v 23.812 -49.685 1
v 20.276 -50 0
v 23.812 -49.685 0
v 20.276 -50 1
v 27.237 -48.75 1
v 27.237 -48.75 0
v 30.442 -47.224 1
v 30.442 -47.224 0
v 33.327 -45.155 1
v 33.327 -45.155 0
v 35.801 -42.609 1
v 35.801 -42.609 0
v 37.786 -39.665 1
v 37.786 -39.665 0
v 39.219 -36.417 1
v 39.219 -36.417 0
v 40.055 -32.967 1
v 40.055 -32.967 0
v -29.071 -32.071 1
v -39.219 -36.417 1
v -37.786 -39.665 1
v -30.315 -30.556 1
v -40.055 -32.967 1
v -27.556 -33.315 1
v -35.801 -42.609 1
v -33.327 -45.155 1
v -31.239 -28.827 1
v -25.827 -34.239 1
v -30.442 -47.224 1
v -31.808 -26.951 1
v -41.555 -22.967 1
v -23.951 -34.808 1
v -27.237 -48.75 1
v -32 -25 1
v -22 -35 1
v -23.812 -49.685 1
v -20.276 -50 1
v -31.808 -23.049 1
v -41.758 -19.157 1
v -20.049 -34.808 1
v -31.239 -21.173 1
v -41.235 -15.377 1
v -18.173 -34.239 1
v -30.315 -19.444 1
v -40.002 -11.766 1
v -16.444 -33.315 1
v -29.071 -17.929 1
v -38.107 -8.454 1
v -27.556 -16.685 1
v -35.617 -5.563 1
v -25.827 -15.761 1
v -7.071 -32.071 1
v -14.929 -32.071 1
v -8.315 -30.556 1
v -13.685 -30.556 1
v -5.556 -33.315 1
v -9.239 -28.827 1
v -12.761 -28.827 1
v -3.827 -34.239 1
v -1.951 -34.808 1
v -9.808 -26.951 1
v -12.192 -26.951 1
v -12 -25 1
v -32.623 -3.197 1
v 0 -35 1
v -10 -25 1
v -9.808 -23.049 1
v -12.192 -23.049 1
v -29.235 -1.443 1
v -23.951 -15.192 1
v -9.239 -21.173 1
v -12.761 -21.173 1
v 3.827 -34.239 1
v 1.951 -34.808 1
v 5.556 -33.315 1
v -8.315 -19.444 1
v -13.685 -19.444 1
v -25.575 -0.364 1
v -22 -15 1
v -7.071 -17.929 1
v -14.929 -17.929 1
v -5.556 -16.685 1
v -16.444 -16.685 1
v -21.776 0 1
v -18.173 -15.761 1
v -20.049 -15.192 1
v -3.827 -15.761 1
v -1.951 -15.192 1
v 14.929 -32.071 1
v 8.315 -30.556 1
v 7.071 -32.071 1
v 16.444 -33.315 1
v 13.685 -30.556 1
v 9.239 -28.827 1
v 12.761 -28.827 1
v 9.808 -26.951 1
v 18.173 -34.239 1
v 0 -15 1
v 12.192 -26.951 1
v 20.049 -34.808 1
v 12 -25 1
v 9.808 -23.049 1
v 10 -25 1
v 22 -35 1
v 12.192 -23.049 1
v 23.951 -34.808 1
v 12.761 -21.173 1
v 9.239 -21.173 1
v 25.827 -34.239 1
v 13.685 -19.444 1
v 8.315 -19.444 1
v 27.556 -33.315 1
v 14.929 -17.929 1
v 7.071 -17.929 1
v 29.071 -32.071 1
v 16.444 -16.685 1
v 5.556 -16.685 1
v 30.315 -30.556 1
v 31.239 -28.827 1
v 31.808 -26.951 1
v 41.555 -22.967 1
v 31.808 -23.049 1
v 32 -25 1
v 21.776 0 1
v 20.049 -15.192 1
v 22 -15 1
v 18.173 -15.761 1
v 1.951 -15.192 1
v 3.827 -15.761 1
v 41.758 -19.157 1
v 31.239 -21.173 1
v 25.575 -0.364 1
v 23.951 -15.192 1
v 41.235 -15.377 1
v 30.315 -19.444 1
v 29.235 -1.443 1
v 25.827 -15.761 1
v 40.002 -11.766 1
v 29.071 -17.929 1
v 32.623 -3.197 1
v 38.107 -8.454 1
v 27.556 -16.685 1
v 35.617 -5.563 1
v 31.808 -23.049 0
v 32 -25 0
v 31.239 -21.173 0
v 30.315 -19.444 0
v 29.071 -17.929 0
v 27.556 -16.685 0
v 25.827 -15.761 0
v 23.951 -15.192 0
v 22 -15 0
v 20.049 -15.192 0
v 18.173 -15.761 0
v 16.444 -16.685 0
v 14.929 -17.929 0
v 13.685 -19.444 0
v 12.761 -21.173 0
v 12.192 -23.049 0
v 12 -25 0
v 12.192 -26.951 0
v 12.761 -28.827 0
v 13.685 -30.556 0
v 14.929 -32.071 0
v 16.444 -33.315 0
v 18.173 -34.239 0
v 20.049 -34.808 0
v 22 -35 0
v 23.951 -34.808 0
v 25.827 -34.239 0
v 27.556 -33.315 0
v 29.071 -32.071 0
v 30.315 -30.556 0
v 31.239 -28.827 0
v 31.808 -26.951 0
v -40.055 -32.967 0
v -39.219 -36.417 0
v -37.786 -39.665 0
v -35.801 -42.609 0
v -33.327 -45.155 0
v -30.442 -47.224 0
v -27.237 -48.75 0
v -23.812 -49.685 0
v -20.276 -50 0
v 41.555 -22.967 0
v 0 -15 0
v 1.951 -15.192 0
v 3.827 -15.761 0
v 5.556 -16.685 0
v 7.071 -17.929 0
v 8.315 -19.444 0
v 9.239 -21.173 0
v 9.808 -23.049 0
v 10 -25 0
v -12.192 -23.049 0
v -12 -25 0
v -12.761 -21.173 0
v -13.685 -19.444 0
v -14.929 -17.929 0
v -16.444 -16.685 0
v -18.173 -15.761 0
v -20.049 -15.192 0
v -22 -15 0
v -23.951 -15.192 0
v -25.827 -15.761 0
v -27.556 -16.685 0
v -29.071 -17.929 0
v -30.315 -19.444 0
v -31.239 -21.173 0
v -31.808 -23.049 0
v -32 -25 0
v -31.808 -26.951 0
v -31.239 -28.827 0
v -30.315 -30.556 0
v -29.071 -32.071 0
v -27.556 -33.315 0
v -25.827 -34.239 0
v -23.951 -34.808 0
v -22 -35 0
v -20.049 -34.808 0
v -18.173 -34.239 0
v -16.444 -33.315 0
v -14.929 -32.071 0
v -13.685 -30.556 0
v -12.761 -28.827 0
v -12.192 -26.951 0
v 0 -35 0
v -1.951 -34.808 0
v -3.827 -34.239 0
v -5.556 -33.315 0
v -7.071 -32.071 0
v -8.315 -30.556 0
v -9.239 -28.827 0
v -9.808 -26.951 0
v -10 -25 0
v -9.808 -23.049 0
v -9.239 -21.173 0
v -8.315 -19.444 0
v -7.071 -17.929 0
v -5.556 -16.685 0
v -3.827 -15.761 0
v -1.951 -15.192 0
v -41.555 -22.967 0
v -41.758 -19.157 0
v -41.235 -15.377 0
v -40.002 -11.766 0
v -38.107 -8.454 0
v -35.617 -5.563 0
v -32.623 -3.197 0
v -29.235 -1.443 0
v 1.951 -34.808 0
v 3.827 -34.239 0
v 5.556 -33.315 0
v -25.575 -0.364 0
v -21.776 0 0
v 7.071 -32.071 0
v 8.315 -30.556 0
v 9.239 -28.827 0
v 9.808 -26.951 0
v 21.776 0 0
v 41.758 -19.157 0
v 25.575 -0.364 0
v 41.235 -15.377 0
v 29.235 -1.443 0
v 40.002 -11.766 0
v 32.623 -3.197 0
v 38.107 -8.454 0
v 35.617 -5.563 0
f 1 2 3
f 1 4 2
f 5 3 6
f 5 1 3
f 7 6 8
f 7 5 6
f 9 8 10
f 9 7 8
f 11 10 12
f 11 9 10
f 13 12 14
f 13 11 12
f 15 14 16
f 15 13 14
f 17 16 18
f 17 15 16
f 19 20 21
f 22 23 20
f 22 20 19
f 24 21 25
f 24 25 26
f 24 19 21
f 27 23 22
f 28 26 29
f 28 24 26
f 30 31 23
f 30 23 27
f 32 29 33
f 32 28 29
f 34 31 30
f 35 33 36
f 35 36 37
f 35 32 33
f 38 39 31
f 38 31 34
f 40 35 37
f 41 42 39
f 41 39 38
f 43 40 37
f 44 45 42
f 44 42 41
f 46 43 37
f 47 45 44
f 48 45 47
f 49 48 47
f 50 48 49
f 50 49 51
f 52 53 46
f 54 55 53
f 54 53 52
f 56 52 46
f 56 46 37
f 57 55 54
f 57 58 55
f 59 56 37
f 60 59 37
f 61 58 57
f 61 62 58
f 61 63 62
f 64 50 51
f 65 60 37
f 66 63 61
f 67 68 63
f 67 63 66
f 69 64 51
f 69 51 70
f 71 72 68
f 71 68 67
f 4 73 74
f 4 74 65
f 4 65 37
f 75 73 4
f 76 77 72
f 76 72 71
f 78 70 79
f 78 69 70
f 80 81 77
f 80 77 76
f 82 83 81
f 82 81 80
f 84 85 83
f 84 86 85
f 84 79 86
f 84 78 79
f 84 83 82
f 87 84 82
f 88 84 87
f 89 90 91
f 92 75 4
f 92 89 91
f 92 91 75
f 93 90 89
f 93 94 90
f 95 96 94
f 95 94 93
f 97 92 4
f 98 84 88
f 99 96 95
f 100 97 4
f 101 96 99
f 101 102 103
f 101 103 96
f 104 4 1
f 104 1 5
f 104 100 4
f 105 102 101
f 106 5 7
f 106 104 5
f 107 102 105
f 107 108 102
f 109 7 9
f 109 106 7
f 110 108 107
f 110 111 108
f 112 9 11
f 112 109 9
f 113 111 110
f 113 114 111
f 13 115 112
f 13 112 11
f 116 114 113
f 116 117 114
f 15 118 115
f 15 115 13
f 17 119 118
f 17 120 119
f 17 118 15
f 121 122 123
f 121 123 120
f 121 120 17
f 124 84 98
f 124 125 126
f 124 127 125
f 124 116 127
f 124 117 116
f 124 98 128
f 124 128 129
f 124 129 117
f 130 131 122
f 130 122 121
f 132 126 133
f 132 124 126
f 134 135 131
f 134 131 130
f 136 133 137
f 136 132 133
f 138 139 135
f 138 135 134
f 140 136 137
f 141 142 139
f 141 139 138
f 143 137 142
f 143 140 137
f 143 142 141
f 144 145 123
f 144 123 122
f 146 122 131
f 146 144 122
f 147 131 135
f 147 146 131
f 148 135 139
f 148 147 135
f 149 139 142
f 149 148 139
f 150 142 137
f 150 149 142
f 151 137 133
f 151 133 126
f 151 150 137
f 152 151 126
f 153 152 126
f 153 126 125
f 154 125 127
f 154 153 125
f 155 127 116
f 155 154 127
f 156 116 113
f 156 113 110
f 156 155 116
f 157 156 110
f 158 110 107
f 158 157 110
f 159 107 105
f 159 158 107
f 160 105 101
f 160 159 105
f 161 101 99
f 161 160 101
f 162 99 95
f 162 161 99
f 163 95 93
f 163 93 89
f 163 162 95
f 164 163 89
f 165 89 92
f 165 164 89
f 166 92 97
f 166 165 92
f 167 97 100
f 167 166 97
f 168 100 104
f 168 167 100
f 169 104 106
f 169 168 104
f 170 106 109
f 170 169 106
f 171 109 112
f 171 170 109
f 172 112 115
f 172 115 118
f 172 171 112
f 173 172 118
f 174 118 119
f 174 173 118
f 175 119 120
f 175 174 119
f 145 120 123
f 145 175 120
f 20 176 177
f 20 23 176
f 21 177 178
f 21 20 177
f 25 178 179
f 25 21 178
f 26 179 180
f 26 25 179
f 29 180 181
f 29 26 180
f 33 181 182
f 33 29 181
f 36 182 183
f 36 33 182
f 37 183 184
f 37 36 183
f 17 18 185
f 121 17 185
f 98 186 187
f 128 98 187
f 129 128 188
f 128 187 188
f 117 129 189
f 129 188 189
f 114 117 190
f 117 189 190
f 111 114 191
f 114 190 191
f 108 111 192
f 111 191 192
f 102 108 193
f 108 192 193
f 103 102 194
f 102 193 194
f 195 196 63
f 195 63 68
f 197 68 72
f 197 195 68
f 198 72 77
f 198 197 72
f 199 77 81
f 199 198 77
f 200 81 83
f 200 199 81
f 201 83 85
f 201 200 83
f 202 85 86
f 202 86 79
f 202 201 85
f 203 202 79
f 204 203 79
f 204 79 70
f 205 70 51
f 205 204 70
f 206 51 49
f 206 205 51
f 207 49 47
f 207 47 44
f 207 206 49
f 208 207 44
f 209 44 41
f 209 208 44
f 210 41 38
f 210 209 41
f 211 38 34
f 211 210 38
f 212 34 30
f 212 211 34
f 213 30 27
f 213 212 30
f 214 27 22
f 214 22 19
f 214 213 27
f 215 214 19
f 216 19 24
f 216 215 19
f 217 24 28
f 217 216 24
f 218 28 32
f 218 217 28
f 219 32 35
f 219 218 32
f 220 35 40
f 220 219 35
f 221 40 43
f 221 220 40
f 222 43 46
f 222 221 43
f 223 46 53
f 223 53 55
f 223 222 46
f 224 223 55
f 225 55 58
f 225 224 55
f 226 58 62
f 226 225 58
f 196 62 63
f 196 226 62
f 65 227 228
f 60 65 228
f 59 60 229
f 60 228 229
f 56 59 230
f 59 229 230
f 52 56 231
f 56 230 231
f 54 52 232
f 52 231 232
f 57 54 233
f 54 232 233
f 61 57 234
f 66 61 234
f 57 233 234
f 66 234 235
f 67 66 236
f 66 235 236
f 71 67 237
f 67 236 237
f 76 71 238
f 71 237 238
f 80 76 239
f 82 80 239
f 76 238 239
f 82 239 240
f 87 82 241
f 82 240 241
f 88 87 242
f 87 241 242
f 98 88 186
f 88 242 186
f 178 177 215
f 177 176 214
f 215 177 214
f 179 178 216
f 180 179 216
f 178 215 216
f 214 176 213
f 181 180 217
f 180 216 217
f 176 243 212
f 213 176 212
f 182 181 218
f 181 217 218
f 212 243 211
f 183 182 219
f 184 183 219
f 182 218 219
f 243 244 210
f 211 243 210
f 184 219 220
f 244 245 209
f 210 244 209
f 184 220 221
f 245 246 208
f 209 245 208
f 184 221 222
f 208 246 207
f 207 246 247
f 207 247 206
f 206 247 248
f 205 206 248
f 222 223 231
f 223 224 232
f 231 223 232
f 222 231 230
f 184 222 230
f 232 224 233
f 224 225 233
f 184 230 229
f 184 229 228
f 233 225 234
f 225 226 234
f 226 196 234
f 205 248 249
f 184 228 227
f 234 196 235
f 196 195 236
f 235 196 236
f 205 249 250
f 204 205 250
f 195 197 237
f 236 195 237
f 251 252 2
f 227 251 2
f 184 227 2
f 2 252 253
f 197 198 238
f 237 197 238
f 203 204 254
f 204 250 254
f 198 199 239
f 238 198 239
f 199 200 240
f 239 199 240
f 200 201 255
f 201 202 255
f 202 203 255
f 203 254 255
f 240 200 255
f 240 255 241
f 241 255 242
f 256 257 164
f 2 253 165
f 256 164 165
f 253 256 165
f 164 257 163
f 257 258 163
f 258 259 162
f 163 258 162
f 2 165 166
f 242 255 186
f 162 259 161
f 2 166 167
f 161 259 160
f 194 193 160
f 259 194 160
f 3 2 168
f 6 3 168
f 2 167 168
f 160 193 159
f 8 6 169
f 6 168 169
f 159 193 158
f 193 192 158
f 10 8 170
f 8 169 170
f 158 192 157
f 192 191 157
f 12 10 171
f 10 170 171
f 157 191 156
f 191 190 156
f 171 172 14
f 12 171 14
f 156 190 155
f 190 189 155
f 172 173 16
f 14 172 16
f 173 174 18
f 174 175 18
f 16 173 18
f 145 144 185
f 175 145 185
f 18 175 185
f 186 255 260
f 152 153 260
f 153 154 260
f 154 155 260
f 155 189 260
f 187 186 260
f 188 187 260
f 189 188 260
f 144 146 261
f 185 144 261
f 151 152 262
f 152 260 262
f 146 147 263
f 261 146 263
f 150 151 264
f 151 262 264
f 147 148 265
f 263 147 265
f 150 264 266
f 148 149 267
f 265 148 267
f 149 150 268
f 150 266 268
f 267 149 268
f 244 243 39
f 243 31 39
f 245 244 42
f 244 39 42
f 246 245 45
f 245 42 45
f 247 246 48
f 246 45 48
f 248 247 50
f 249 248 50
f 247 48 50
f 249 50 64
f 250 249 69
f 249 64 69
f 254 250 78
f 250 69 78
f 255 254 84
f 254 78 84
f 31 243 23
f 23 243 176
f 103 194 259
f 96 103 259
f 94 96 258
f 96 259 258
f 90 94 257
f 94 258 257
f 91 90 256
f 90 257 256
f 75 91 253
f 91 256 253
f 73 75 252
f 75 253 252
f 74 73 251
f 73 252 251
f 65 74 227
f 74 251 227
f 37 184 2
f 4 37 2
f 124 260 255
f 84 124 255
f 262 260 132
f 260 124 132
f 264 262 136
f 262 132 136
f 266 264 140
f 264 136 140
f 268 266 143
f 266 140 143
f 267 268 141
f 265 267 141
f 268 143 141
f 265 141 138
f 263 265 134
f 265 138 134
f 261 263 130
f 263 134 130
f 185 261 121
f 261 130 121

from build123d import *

# Parameters (mm, degrees)
F0_R     = 10
F1_DEPTH = 1
F2_R     = 20


with BuildPart() as f1:
    # F0 (on Top) → F1 (new body)
    with BuildSketch(Plane.XY):
        with BuildLine():
            Line((0, 0), (-45, 0))
            Line((-45, 0), (-37.5, -50))
            Line((-37.5, -50), (0, -50))
            Line((0, -50), (0, -35))
            ThreePointArc((0, -35), (-10, -25), (0, -15))
            Line((0, -15), (0, 0))
        make_face()
        with Locations((-22, -25)):
            Circle(F0_R, mode=Mode.SUBTRACT)
        with BuildLine():
            Line((45, 0), (0, 0))
            Line((0, 0), (0, -15))
            ThreePointArc((0, -15), (7.071068, -17.928932), (10, -25))
            ThreePointArc((10, -25), (7.071068, -32.071068), (0, -35))
            Line((0, -35), (0, -50))
            Line((0, -50), (37.5, -50))
            Line((37.5, -50), (45, 0))
        make_face()
        with Locations((22, -25)):
            Circle(F0_R, mode=Mode.SUBTRACT)
    extrude(amount=F1_DEPTH)

    # F2
    f2_edges = [f1.edges().sort_by_distance(p)[0] for p in [
        (-37.5, -50, 0.5),
        (37.5, -50, 0.5),
        (45, 0, 0.5),
        (-45, 0, 0.5),
    ]]
    fillet(f2_edges, radius=F2_R)


solid = f1.part
